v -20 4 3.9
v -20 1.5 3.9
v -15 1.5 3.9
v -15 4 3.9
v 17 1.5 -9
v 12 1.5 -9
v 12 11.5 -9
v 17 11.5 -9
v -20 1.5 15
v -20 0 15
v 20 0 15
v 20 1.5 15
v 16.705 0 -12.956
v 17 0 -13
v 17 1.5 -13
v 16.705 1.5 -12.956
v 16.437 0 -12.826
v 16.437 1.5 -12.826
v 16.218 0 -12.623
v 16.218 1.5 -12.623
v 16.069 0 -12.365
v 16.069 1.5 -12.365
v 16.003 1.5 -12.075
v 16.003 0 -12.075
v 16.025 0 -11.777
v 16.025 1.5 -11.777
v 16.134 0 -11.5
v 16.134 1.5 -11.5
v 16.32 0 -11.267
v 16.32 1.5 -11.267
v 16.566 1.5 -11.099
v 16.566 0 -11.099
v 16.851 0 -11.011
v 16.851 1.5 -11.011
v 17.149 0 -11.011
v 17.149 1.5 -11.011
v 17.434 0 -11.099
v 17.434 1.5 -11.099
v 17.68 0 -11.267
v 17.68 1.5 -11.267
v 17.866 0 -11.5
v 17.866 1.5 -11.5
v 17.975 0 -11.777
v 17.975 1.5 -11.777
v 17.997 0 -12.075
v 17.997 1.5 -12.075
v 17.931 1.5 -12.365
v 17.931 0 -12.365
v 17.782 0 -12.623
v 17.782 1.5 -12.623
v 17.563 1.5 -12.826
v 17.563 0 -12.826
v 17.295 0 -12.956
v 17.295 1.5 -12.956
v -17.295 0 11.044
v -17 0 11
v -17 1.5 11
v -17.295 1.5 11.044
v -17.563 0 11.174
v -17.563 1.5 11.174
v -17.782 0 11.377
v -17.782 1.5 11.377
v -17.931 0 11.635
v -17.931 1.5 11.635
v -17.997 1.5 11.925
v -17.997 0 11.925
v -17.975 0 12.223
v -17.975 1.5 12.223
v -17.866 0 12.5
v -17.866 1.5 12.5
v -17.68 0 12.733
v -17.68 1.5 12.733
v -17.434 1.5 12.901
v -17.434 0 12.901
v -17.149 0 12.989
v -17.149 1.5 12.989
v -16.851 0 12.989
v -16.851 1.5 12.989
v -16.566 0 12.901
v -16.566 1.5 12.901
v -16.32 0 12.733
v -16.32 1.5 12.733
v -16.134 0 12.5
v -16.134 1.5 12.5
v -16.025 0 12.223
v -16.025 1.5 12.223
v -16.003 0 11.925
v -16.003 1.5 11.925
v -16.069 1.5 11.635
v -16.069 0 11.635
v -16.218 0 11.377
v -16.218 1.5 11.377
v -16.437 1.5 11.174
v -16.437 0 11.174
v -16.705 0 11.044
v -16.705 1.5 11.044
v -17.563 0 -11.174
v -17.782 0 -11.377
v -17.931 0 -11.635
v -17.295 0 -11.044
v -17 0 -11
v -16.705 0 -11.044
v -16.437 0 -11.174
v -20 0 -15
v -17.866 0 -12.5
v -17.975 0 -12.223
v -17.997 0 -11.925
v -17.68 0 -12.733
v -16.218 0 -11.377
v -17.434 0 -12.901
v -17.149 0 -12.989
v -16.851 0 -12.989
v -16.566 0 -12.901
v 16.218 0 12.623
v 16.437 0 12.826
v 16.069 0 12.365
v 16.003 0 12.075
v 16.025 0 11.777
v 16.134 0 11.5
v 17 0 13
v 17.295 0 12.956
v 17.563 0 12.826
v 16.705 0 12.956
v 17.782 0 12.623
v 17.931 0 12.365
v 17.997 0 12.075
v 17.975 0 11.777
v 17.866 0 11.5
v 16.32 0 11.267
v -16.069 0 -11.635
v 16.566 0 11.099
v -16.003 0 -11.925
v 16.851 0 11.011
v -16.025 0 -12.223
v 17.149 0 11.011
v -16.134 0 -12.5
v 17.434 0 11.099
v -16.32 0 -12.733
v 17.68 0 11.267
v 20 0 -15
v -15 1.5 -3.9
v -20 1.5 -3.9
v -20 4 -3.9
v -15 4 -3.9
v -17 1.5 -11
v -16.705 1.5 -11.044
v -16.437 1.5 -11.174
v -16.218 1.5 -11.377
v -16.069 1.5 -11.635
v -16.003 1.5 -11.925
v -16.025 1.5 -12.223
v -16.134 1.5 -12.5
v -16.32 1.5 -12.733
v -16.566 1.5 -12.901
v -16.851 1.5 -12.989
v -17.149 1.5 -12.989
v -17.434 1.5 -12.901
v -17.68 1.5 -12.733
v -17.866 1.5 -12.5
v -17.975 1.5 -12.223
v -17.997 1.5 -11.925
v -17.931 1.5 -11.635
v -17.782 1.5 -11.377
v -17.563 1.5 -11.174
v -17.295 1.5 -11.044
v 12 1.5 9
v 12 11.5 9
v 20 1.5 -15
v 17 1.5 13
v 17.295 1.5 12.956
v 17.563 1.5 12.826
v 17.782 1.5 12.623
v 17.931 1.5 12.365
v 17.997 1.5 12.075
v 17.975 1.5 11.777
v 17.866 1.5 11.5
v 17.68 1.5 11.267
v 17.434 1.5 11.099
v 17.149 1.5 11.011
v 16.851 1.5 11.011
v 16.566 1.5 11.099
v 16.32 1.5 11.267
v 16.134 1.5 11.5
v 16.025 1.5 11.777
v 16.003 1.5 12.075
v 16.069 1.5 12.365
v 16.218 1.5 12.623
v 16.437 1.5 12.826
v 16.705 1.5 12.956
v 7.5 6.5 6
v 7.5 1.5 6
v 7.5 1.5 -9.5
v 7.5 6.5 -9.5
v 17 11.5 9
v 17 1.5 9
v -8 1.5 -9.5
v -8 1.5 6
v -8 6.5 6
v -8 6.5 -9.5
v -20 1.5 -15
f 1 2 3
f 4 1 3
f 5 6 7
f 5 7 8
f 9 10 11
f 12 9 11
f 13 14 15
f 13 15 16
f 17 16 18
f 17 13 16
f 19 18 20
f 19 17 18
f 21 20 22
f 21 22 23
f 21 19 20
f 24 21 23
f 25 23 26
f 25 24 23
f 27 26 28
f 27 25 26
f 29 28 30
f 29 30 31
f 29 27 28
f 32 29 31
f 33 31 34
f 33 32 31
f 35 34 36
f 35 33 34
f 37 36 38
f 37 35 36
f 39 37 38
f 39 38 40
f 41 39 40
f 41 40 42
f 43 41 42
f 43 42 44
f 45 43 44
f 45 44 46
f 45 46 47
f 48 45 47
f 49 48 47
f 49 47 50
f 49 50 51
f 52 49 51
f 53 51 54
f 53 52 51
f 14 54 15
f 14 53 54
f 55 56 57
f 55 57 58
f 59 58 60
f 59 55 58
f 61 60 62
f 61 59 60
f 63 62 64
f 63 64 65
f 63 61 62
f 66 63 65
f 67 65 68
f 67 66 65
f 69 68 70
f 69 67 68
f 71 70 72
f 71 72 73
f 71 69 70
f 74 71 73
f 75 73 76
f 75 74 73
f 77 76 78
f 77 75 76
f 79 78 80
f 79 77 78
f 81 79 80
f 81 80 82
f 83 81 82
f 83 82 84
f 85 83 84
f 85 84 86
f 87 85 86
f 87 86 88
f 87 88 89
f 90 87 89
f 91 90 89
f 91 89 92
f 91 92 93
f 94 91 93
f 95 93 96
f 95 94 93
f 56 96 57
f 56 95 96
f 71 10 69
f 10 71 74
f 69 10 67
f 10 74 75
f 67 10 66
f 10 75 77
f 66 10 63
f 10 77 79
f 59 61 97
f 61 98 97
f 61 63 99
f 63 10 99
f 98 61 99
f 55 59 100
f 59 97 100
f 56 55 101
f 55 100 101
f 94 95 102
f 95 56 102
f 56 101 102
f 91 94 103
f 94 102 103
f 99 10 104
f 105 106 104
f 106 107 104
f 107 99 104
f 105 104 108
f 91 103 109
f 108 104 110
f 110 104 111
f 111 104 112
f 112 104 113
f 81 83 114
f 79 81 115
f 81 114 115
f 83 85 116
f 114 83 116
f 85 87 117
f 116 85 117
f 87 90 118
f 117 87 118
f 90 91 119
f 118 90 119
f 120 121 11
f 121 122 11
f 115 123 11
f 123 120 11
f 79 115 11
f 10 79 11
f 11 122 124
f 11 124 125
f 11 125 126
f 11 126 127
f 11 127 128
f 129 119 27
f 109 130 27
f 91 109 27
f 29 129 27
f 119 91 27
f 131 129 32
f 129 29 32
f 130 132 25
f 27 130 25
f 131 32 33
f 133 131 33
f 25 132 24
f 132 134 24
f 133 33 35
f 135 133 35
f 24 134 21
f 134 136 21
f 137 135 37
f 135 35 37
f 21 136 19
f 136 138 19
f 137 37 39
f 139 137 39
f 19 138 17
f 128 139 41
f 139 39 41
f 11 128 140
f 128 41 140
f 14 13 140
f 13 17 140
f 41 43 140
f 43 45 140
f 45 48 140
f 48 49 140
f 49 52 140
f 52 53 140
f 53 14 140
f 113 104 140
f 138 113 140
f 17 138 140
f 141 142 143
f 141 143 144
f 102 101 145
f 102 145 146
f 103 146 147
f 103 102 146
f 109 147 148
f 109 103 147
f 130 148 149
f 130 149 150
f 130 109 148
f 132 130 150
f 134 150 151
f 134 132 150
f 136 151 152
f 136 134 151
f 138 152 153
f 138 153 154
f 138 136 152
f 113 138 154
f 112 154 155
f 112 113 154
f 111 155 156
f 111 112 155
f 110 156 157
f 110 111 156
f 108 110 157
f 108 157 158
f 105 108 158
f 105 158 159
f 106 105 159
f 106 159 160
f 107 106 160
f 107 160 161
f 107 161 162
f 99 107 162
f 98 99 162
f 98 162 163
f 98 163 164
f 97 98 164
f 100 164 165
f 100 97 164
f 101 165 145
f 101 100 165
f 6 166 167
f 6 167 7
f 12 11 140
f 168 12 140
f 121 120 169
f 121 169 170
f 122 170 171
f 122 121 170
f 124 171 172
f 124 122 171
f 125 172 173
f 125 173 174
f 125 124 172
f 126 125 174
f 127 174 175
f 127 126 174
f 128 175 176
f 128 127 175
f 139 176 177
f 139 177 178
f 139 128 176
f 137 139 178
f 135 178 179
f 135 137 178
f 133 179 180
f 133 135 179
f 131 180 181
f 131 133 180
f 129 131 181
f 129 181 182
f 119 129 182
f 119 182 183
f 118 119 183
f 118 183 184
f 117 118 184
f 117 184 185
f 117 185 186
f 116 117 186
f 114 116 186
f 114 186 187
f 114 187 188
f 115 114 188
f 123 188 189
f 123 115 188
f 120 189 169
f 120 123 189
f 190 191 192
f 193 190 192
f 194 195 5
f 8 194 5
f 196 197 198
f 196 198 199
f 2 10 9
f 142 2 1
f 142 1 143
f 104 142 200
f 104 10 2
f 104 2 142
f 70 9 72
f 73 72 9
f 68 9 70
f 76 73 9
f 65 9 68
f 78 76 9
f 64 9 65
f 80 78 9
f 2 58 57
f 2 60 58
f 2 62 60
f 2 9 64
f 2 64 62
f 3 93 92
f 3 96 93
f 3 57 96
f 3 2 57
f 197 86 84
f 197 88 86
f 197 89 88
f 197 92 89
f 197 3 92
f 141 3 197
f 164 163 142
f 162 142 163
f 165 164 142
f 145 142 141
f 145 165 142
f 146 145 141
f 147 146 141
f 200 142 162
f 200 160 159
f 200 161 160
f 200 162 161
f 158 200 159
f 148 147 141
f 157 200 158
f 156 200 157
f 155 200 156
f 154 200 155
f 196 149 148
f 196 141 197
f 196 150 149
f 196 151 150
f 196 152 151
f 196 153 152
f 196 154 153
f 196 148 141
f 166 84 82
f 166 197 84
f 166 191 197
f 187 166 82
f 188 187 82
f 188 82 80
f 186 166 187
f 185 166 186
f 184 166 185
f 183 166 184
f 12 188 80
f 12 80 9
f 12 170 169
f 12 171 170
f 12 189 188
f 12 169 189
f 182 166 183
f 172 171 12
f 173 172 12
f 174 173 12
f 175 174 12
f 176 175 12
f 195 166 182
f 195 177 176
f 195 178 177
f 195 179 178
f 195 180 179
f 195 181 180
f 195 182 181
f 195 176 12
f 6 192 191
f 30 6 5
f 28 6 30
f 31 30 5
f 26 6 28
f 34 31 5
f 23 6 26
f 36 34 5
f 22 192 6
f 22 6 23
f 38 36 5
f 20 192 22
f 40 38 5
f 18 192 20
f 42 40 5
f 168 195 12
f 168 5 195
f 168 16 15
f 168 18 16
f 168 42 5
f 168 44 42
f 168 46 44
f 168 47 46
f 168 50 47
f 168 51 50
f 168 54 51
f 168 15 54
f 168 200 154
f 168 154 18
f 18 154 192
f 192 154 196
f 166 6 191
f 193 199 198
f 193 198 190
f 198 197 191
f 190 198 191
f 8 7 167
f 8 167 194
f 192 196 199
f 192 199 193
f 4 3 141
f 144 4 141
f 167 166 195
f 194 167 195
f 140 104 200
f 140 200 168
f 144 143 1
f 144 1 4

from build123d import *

# Parameters (mm, degrees)
SKETCH_1_W      = 40
SKETCH_1_H      = 30
SKETCH_1_R      = 1
EXTRUDE_1_DEPTH = 1.5
SKETCH_2_W      = 5
SKETCH_2_H      = 7.8
EXTRUDE_2_DEPTH = 2.5
SKETCH_3_W      = 15.5
SKETCH_3_H      = 15.5
EXTRUDE_3_DEPTH = 5
SKETCH_4_W      = 5
SKETCH_4_H      = 18
EXTRUDE_4_DEPTH = 10


with BuildPart() as part:
    # 草图1 → 凸台-拉伸1 (new body)
    with BuildSketch(Plane(origin=(0, 0, 0), x_dir=(1, 0, 0), z_dir=(0, 1, 0))):
        Rectangle(SKETCH_1_W, SKETCH_1_H)
        with Locations(Location((-17, 12, 0), (0, 0, 270))):
            Circle(SKETCH_1_R, mode=Mode.SUBTRACT)
        with Locations(Location((17, 12, 0), (0, 0, 90))):
            Circle(SKETCH_1_R, mode=Mode.SUBTRACT)
        with Locations(Location((17, -12, 0), (0, 0, 270))):
            Circle(SKETCH_1_R, mode=Mode.SUBTRACT)
        with Locations(Location((-17, -12, 0), (0, 0, 90))):
            Circle(SKETCH_1_R, mode=Mode.SUBTRACT)
    extrude(amount=EXTRUDE_1_DEPTH)

    # 草图2 → 凸台-拉伸2 (add)
    with BuildSketch(Plane(origin=(0, 1.5, 0), x_dir=(1, 0, 0), z_dir=(0, 1, 0))):
        with Locations((-17.5, 0)):
            Rectangle(SKETCH_2_W, SKETCH_2_H)
    extrude(amount=EXTRUDE_2_DEPTH)

    # 草图3 → 凸台-拉伸3 (add)
    with BuildSketch(Plane(origin=(0, 1.5, 0), x_dir=(1, 0, 0), z_dir=(0, 1, 0))):
        with Locations((-0.25, 1.75)):
            Rectangle(SKETCH_3_W, SKETCH_3_H)
    extrude(amount=EXTRUDE_3_DEPTH)

    # 草图4 → 凸台-拉伸4 (add)
    with BuildSketch(Plane(origin=(0, 1.5, 0), x_dir=(1, 0, 0), z_dir=(0, 1, 0))):
        with Locations((14.5, 0)):
            Rectangle(SKETCH_4_W, SKETCH_4_H)
    extrude(amount=EXTRUDE_4_DEPTH)


solid = part.part
